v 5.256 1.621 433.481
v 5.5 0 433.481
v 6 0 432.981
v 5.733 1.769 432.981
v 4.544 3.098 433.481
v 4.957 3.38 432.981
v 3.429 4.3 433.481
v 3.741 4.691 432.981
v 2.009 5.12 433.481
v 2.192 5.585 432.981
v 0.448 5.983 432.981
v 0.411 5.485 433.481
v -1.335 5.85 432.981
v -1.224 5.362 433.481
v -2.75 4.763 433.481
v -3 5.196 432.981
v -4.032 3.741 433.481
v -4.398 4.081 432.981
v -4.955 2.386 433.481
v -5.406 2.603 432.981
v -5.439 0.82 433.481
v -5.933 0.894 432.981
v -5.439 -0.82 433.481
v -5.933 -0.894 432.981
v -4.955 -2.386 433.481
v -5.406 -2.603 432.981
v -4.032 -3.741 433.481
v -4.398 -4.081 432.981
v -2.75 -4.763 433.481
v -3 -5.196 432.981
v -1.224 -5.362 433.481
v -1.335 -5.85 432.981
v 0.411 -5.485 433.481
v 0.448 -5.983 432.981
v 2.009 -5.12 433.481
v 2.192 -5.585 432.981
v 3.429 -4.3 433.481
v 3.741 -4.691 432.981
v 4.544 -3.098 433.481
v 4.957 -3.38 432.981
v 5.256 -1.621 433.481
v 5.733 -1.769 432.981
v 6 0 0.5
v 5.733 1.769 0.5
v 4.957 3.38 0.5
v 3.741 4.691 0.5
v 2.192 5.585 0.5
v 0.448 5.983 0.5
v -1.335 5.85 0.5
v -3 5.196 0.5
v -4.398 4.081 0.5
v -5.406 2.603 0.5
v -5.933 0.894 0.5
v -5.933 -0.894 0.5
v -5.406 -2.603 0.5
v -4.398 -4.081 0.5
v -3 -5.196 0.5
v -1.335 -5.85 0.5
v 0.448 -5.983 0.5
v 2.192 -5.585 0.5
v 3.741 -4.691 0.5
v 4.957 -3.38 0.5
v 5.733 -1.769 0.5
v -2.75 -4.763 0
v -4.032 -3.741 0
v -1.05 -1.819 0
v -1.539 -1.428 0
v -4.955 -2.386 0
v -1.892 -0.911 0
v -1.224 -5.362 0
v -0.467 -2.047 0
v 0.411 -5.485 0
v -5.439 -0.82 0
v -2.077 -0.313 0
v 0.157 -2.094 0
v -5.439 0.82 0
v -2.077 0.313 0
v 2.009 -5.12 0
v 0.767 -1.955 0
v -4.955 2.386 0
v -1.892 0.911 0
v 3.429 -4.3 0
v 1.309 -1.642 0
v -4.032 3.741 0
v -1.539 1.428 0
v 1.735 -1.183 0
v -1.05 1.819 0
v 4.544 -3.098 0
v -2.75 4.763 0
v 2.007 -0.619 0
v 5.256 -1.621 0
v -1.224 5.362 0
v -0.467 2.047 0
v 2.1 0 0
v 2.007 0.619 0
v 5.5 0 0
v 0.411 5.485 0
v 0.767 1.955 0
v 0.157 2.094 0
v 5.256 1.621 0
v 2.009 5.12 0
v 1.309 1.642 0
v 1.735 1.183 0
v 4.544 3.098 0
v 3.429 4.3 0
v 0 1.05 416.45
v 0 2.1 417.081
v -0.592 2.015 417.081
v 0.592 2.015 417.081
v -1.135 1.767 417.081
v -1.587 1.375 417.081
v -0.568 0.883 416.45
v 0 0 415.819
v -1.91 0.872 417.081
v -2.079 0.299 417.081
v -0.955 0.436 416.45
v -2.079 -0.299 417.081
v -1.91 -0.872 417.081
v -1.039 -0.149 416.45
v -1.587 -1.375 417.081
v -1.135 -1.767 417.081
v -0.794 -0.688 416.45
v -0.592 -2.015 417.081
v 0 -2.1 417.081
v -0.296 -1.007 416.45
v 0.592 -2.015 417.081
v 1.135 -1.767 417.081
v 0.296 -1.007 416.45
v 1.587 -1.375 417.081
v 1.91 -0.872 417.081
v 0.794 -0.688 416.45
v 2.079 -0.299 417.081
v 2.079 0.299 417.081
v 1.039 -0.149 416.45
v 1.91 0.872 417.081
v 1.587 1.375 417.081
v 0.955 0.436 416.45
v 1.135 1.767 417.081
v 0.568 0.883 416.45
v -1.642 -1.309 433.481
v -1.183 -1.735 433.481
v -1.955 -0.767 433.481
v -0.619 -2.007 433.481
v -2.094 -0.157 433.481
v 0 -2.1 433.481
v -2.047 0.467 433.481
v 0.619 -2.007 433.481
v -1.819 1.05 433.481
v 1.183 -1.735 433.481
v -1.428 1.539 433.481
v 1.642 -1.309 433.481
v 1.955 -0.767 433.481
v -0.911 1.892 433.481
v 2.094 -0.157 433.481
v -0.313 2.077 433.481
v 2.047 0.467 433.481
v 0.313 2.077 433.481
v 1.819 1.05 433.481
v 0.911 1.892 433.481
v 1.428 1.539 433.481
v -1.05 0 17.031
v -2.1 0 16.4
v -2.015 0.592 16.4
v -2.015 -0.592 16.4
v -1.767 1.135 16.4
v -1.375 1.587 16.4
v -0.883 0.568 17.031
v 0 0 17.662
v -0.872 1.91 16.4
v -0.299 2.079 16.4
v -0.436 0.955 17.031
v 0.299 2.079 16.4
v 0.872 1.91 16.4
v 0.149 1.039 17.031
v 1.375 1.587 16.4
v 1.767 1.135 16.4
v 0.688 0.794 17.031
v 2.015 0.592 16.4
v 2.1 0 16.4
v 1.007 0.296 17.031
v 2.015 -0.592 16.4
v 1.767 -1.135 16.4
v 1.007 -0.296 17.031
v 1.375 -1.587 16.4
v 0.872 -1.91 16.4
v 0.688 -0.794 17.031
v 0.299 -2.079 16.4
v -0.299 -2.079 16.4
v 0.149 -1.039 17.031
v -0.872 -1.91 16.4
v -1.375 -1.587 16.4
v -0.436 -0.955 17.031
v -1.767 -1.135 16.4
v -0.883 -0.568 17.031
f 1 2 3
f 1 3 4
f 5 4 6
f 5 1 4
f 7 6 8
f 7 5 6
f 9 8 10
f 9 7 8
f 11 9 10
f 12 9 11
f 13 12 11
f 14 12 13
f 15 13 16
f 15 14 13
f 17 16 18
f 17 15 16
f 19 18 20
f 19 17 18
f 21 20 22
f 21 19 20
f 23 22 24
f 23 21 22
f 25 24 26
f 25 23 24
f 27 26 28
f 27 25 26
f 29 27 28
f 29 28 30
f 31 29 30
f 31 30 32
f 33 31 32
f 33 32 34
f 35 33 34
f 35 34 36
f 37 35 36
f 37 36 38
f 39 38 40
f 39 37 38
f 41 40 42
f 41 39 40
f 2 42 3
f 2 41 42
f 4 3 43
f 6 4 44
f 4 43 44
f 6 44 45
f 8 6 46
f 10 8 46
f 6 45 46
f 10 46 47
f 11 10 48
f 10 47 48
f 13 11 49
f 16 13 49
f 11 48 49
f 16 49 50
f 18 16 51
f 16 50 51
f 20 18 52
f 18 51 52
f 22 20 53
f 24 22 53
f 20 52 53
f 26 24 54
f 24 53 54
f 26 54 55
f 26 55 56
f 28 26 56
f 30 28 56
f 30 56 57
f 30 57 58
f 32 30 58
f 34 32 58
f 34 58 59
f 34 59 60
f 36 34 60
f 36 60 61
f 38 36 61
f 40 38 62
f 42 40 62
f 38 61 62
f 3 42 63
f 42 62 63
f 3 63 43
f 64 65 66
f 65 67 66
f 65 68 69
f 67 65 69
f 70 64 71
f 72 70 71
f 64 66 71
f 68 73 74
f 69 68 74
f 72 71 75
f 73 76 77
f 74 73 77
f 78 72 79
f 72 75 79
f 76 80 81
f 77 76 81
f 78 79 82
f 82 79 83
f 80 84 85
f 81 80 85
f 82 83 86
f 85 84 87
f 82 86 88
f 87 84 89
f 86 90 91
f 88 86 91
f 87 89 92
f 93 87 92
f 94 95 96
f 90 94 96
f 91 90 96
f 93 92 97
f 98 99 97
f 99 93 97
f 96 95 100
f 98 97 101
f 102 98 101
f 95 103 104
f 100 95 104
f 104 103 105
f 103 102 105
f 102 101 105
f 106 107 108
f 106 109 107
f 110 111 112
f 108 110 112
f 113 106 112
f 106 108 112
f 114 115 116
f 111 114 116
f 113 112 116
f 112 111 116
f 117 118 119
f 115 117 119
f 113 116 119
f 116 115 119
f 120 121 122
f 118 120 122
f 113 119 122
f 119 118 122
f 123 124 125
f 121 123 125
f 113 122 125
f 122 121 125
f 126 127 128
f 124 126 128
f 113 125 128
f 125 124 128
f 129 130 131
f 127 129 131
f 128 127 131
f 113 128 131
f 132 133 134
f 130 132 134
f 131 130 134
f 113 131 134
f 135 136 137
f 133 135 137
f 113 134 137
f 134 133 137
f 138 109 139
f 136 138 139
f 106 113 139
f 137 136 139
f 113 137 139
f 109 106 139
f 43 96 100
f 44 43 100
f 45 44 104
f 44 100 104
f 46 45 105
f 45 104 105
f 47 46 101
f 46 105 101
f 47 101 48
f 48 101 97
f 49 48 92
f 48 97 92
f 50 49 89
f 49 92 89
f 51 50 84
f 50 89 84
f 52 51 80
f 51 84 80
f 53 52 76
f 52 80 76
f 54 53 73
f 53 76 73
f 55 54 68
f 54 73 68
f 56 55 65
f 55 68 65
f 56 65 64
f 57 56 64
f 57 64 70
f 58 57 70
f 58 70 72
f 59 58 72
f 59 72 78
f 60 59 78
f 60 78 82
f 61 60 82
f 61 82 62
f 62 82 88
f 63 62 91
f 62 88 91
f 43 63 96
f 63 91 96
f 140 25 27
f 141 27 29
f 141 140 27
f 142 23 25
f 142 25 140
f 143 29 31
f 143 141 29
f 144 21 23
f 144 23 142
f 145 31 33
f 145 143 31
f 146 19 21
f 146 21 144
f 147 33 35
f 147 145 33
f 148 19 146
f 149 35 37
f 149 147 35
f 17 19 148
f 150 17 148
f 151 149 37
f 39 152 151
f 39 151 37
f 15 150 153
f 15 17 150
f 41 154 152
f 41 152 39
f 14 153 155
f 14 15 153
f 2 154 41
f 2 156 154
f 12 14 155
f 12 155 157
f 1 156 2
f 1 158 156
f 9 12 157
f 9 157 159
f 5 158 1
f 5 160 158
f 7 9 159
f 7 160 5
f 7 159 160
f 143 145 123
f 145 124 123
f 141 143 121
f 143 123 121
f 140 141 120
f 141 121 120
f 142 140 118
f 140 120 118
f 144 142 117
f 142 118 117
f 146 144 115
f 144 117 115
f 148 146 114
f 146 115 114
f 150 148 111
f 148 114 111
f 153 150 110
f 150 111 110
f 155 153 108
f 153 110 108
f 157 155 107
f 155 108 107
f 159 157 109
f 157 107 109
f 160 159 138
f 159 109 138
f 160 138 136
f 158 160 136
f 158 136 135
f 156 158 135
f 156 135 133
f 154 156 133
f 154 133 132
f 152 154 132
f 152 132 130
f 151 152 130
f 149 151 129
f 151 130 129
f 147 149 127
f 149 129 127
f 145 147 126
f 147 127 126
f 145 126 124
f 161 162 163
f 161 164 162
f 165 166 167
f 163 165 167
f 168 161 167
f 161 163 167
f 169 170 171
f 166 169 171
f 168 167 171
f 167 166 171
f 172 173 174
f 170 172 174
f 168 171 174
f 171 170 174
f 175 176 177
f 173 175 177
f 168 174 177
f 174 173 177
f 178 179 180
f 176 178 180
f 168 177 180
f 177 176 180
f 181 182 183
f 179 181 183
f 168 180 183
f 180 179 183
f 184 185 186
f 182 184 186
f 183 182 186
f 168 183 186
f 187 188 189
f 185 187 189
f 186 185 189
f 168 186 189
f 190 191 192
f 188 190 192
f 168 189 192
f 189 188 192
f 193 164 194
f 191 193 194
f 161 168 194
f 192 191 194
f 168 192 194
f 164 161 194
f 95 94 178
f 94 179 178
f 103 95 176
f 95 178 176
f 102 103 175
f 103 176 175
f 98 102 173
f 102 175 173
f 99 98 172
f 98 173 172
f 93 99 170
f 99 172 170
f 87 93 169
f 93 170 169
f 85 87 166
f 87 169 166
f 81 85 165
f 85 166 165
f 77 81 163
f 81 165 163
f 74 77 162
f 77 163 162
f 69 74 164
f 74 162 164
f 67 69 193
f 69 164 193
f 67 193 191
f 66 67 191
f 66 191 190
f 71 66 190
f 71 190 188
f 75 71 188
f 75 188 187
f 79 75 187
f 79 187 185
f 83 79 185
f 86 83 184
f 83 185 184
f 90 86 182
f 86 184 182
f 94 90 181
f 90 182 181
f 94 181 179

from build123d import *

# Parameters (mm, degrees)
SKETCH1_R                           = 6
BOSS_EXTRUDE1_DEPTH                 = 433.48108
CHAMFER1_SIZE                       = 0.5
M5X0_8_TAPPED_HOLE1_D               = 4.2
M5X0_8_TAPPED_HOLE1_DEPTH           = 16.4
M5X0_8_TAPPED_HOLE1_TIP             = 1.2618073
M5X0_8_TAPPED_HOLE1_ON_FACE_2_D     = 4.2
M5X0_8_TAPPED_HOLE1_ON_FACE_2_DEPTH = 16.4
M5X0_8_TAPPED_HOLE1_ON_FACE_2_TIP   = 1.2618073


with BuildPart() as part:
    # Sketch1 → Boss-Extrude1 (new body)
    with BuildSketch(Plane.XY):
        Circle(SKETCH1_R)
    extrude(amount=BOSS_EXTRUDE1_DEPTH)

    # Chamfer1
    chamfer1_edges = [part.edges().sort_by_distance(p)[0] for p in [
        (-6, 0, 0),
        (-6, 0, 433.48108),
    ]]
    chamfer(chamfer1_edges, length=CHAMFER1_SIZE)

    # M5x0.8 Tapped Hole1
    with Locations(Plane(origin=(0, 0, 433.48108), x_dir=(0, 1, 0), z_dir=(0, 0, 1))):
        with Locations((0, 0)):
            Hole(M5X0_8_TAPPED_HOLE1_D / 2, depth=M5X0_8_TAPPED_HOLE1_DEPTH)
            with Locations((0, 0, -(M5X0_8_TAPPED_HOLE1_DEPTH + M5X0_8_TAPPED_HOLE1_TIP / 2))):  # 118° drill point
                Cone(0, M5X0_8_TAPPED_HOLE1_D / 2, M5X0_8_TAPPED_HOLE1_TIP, mode=Mode.SUBTRACT)

    # M5x0.8 Tapped Hole1 on face 2
    with Locations(Plane(origin=(0, 0, 0), x_dir=(-1, 0, 0), z_dir=(0, 0, -1))):
        with Locations((0, 0)):
            Hole(M5X0_8_TAPPED_HOLE1_ON_FACE_2_D / 2, depth=M5X0_8_TAPPED_HOLE1_ON_FACE_2_DEPTH)
            with Locations((0, 0, -(M5X0_8_TAPPED_HOLE1_ON_FACE_2_DEPTH + M5X0_8_TAPPED_HOLE1_ON_FACE_2_TIP / 2))):  # 118° drill point
                Cone(0, M5X0_8_TAPPED_HOLE1_ON_FACE_2_D / 2, M5X0_8_TAPPED_HOLE1_ON_FACE_2_TIP, mode=Mode.SUBTRACT)


solid = part.part
